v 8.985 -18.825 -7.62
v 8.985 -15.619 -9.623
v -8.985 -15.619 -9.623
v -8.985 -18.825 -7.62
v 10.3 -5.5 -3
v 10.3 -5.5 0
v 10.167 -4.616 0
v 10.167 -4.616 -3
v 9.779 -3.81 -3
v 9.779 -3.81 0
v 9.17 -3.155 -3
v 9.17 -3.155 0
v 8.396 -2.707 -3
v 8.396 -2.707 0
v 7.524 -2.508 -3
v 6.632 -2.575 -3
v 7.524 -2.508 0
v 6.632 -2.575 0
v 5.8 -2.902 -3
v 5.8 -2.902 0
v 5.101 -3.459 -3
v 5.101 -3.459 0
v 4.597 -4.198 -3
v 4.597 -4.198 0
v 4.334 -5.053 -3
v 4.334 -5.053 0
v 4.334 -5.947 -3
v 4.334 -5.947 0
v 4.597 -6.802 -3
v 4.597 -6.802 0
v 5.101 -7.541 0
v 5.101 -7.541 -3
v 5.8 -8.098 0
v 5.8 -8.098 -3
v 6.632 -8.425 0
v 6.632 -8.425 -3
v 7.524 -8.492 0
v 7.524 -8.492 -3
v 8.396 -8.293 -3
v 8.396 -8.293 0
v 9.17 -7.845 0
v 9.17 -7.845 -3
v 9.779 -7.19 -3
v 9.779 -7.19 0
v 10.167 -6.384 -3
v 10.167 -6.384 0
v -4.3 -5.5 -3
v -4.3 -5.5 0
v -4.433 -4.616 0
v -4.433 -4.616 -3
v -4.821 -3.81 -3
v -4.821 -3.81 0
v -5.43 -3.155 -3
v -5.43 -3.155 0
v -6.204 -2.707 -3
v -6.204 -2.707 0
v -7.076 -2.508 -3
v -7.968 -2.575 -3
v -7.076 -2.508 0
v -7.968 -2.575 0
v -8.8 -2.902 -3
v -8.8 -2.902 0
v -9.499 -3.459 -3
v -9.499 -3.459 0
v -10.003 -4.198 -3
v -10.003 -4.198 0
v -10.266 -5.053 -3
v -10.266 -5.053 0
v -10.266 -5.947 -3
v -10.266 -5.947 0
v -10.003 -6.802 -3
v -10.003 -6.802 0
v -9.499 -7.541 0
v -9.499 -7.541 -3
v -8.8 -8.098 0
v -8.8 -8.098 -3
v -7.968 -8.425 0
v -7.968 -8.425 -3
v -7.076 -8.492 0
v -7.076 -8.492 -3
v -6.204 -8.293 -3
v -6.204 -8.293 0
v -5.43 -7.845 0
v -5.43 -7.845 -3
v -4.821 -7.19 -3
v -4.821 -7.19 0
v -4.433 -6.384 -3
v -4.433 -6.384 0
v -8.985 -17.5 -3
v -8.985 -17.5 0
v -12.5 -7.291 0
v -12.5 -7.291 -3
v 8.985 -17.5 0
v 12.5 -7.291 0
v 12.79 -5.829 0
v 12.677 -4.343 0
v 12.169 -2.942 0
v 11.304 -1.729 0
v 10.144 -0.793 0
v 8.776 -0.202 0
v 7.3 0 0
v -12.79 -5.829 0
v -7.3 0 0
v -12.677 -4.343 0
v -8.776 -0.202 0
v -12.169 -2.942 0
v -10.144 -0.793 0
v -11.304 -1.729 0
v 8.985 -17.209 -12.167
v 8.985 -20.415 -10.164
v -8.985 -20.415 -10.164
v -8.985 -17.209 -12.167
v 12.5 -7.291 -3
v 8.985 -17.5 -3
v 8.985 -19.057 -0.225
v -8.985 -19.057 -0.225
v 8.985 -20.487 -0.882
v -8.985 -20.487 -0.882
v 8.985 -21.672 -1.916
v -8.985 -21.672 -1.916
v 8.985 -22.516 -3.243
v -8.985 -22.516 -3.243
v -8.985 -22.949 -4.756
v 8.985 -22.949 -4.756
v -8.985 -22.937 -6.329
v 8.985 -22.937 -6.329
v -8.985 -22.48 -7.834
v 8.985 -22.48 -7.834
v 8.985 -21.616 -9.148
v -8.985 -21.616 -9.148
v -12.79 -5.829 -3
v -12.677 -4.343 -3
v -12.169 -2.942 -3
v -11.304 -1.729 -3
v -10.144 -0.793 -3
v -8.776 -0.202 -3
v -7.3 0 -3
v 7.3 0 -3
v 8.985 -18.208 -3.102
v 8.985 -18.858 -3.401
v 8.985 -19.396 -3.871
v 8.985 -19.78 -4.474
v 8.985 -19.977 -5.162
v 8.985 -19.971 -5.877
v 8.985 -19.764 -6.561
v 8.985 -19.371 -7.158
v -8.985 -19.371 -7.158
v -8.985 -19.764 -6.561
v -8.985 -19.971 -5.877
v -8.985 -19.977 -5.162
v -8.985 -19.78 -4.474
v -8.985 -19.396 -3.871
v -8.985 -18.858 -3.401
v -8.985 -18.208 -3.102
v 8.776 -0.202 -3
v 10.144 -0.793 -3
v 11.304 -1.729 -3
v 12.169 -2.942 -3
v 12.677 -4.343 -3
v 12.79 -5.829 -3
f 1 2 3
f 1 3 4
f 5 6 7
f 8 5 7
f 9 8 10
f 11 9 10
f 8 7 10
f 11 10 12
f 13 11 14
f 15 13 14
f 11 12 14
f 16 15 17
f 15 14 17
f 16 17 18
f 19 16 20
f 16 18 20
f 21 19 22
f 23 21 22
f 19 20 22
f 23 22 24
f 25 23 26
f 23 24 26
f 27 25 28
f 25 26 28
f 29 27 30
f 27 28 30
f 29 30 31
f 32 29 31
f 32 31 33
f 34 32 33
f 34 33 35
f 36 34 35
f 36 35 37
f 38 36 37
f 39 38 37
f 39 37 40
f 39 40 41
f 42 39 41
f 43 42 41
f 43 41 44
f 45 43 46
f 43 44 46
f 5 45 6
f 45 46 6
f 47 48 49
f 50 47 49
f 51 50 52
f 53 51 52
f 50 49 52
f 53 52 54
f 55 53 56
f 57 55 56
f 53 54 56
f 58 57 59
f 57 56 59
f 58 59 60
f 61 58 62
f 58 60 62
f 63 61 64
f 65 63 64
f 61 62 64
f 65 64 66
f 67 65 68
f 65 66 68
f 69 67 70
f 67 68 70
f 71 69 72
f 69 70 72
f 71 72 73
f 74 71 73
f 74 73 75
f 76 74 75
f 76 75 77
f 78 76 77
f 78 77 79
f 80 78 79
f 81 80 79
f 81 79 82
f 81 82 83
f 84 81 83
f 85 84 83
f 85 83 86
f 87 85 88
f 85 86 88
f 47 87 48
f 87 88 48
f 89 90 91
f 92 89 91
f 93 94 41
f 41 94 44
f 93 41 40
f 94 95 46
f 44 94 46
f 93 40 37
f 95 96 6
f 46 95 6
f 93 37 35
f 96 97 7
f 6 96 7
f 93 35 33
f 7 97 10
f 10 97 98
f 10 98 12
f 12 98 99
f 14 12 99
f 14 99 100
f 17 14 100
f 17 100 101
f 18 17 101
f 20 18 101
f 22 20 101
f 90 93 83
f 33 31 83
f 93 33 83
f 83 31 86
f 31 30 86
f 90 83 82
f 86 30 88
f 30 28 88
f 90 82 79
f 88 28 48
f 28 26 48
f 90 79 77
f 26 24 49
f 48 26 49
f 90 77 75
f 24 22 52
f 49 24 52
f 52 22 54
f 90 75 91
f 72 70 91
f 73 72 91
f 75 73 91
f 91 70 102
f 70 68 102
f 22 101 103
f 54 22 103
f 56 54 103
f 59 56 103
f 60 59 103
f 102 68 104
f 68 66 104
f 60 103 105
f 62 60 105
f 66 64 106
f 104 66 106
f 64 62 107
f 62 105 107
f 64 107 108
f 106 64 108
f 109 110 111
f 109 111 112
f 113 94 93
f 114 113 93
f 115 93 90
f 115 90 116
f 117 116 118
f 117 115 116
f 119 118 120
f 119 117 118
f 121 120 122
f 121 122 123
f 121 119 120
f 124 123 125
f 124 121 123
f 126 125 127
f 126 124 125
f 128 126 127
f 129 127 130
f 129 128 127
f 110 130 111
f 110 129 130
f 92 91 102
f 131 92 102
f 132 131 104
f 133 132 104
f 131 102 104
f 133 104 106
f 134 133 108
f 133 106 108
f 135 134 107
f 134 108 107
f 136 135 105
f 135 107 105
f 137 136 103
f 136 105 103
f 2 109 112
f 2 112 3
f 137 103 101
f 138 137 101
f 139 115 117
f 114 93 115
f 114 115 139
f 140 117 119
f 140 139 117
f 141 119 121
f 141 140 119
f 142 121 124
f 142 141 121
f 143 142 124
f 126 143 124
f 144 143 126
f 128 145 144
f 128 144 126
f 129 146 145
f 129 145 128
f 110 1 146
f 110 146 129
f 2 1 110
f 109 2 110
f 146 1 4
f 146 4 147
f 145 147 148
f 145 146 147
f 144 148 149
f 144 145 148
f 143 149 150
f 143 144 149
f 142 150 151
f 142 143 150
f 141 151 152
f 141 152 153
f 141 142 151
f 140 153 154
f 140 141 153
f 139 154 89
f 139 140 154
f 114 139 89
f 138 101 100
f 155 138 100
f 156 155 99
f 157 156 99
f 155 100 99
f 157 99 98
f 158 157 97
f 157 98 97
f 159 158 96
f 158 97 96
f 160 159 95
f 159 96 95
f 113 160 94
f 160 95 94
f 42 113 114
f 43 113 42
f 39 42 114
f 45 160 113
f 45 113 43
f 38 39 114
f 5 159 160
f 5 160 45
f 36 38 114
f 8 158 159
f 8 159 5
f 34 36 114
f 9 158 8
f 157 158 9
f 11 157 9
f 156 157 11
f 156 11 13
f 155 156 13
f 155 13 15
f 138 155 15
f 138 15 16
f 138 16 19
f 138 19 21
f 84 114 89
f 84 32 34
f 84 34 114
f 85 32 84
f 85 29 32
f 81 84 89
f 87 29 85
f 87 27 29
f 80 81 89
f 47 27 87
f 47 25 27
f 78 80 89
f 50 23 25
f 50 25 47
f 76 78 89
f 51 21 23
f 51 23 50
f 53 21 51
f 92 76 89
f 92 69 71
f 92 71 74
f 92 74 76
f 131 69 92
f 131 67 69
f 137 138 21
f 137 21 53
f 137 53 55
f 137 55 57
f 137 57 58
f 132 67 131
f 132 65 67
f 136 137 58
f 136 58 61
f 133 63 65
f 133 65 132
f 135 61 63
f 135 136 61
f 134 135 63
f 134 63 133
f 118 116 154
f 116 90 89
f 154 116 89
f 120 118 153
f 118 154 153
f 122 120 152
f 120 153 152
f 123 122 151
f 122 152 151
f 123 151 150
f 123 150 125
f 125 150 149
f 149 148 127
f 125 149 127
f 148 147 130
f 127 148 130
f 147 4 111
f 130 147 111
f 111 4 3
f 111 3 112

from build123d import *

# Parameters (mm, degrees)
SCHIZZO2_R               = 3
BASE_FLANGIA1_DEPTH      = 3
BORDO_FLANGIA3_DEPTH     = 17.969964774
TAGLIO_ESTRUSIONE1_DEPTH = 35.433191913


# Sheet-metal steps are written as plain solids
with BuildPart() as part:
    # Schizzo2 → Base-Flangia1 (new body)
    with BuildSketch(Plane.XY):
        with BuildLine():
            Line((-7.3, 0), (7.3, 0))
            ThreePointArc((7.3, 0), (11.777635351, -2.306133744), (12.500352166, -7.29062485))
            Line((12.500352166, -7.29062485), (8.984982387, -17.5))
            Line((8.984982387, -17.5), (-8.984982387, -17.5))
            Line((-8.984982387, -17.5), (-12.500352166, -7.29062485))
            ThreePointArc((-12.500352166, -7.29062485), (-11.777635351, -2.306133744), (-7.3, 0))
        make_face()
        with Locations((-7.3, -5.5)):
            Circle(SCHIZZO2_R, mode=Mode.SUBTRACT)
        with Locations((7.3, -5.5)):
            Circle(SCHIZZO2_R, mode=Mode.SUBTRACT)
    extrude(amount=-BASE_FLANGIA1_DEPTH)

    # Bordo-Flangia3 section (across the edge) → Bordo-Flangia3 (add)
    with BuildSketch(Plane(origin=(8.984982387, -26.21853611, -3), x_dir=(0, 0.529919264233206, 0.8480480961564254), z_dir=(-1, 0, 0))):
        with BuildLine():
            Line((-3, 8.71853611), (-3, 15))
            Line((-3, 15), (0, 15))
            Line((0, 15), (0, 8.71853611))
            ThreePointArc((0, 8.71853611), (1.81090661, 6.31538187), (4.62012024, 7.393737949))
            Line((4.62012024, 7.393737949), (7.164264529, 5.803980156))
            ThreePointArc((7.164264529, 5.803980156), (0.983994543, 3.431596782), (-3, 8.71853611))
        make_face()
    extrude(amount=BORDO_FLANGIA3_DEPTH)

    # Schizzo25 → Taglio-Estrusione1 (cut, through all)
    with BuildSketch(Plane(origin=(8.984982387, 0, 0), x_dir=(0, 0, -1), z_dir=(1, 0, 0))):
        Polygon((9.623215059, -15.619176357), (10.948788963, -13.497814667), (13.492933252, -15.08757246), (12.167359348, -17.20893415), align=None)
    extrude(amount=-TAGLIO_ESTRUSIONE1_DEPTH, mode=Mode.SUBTRACT)


solid = part.part
